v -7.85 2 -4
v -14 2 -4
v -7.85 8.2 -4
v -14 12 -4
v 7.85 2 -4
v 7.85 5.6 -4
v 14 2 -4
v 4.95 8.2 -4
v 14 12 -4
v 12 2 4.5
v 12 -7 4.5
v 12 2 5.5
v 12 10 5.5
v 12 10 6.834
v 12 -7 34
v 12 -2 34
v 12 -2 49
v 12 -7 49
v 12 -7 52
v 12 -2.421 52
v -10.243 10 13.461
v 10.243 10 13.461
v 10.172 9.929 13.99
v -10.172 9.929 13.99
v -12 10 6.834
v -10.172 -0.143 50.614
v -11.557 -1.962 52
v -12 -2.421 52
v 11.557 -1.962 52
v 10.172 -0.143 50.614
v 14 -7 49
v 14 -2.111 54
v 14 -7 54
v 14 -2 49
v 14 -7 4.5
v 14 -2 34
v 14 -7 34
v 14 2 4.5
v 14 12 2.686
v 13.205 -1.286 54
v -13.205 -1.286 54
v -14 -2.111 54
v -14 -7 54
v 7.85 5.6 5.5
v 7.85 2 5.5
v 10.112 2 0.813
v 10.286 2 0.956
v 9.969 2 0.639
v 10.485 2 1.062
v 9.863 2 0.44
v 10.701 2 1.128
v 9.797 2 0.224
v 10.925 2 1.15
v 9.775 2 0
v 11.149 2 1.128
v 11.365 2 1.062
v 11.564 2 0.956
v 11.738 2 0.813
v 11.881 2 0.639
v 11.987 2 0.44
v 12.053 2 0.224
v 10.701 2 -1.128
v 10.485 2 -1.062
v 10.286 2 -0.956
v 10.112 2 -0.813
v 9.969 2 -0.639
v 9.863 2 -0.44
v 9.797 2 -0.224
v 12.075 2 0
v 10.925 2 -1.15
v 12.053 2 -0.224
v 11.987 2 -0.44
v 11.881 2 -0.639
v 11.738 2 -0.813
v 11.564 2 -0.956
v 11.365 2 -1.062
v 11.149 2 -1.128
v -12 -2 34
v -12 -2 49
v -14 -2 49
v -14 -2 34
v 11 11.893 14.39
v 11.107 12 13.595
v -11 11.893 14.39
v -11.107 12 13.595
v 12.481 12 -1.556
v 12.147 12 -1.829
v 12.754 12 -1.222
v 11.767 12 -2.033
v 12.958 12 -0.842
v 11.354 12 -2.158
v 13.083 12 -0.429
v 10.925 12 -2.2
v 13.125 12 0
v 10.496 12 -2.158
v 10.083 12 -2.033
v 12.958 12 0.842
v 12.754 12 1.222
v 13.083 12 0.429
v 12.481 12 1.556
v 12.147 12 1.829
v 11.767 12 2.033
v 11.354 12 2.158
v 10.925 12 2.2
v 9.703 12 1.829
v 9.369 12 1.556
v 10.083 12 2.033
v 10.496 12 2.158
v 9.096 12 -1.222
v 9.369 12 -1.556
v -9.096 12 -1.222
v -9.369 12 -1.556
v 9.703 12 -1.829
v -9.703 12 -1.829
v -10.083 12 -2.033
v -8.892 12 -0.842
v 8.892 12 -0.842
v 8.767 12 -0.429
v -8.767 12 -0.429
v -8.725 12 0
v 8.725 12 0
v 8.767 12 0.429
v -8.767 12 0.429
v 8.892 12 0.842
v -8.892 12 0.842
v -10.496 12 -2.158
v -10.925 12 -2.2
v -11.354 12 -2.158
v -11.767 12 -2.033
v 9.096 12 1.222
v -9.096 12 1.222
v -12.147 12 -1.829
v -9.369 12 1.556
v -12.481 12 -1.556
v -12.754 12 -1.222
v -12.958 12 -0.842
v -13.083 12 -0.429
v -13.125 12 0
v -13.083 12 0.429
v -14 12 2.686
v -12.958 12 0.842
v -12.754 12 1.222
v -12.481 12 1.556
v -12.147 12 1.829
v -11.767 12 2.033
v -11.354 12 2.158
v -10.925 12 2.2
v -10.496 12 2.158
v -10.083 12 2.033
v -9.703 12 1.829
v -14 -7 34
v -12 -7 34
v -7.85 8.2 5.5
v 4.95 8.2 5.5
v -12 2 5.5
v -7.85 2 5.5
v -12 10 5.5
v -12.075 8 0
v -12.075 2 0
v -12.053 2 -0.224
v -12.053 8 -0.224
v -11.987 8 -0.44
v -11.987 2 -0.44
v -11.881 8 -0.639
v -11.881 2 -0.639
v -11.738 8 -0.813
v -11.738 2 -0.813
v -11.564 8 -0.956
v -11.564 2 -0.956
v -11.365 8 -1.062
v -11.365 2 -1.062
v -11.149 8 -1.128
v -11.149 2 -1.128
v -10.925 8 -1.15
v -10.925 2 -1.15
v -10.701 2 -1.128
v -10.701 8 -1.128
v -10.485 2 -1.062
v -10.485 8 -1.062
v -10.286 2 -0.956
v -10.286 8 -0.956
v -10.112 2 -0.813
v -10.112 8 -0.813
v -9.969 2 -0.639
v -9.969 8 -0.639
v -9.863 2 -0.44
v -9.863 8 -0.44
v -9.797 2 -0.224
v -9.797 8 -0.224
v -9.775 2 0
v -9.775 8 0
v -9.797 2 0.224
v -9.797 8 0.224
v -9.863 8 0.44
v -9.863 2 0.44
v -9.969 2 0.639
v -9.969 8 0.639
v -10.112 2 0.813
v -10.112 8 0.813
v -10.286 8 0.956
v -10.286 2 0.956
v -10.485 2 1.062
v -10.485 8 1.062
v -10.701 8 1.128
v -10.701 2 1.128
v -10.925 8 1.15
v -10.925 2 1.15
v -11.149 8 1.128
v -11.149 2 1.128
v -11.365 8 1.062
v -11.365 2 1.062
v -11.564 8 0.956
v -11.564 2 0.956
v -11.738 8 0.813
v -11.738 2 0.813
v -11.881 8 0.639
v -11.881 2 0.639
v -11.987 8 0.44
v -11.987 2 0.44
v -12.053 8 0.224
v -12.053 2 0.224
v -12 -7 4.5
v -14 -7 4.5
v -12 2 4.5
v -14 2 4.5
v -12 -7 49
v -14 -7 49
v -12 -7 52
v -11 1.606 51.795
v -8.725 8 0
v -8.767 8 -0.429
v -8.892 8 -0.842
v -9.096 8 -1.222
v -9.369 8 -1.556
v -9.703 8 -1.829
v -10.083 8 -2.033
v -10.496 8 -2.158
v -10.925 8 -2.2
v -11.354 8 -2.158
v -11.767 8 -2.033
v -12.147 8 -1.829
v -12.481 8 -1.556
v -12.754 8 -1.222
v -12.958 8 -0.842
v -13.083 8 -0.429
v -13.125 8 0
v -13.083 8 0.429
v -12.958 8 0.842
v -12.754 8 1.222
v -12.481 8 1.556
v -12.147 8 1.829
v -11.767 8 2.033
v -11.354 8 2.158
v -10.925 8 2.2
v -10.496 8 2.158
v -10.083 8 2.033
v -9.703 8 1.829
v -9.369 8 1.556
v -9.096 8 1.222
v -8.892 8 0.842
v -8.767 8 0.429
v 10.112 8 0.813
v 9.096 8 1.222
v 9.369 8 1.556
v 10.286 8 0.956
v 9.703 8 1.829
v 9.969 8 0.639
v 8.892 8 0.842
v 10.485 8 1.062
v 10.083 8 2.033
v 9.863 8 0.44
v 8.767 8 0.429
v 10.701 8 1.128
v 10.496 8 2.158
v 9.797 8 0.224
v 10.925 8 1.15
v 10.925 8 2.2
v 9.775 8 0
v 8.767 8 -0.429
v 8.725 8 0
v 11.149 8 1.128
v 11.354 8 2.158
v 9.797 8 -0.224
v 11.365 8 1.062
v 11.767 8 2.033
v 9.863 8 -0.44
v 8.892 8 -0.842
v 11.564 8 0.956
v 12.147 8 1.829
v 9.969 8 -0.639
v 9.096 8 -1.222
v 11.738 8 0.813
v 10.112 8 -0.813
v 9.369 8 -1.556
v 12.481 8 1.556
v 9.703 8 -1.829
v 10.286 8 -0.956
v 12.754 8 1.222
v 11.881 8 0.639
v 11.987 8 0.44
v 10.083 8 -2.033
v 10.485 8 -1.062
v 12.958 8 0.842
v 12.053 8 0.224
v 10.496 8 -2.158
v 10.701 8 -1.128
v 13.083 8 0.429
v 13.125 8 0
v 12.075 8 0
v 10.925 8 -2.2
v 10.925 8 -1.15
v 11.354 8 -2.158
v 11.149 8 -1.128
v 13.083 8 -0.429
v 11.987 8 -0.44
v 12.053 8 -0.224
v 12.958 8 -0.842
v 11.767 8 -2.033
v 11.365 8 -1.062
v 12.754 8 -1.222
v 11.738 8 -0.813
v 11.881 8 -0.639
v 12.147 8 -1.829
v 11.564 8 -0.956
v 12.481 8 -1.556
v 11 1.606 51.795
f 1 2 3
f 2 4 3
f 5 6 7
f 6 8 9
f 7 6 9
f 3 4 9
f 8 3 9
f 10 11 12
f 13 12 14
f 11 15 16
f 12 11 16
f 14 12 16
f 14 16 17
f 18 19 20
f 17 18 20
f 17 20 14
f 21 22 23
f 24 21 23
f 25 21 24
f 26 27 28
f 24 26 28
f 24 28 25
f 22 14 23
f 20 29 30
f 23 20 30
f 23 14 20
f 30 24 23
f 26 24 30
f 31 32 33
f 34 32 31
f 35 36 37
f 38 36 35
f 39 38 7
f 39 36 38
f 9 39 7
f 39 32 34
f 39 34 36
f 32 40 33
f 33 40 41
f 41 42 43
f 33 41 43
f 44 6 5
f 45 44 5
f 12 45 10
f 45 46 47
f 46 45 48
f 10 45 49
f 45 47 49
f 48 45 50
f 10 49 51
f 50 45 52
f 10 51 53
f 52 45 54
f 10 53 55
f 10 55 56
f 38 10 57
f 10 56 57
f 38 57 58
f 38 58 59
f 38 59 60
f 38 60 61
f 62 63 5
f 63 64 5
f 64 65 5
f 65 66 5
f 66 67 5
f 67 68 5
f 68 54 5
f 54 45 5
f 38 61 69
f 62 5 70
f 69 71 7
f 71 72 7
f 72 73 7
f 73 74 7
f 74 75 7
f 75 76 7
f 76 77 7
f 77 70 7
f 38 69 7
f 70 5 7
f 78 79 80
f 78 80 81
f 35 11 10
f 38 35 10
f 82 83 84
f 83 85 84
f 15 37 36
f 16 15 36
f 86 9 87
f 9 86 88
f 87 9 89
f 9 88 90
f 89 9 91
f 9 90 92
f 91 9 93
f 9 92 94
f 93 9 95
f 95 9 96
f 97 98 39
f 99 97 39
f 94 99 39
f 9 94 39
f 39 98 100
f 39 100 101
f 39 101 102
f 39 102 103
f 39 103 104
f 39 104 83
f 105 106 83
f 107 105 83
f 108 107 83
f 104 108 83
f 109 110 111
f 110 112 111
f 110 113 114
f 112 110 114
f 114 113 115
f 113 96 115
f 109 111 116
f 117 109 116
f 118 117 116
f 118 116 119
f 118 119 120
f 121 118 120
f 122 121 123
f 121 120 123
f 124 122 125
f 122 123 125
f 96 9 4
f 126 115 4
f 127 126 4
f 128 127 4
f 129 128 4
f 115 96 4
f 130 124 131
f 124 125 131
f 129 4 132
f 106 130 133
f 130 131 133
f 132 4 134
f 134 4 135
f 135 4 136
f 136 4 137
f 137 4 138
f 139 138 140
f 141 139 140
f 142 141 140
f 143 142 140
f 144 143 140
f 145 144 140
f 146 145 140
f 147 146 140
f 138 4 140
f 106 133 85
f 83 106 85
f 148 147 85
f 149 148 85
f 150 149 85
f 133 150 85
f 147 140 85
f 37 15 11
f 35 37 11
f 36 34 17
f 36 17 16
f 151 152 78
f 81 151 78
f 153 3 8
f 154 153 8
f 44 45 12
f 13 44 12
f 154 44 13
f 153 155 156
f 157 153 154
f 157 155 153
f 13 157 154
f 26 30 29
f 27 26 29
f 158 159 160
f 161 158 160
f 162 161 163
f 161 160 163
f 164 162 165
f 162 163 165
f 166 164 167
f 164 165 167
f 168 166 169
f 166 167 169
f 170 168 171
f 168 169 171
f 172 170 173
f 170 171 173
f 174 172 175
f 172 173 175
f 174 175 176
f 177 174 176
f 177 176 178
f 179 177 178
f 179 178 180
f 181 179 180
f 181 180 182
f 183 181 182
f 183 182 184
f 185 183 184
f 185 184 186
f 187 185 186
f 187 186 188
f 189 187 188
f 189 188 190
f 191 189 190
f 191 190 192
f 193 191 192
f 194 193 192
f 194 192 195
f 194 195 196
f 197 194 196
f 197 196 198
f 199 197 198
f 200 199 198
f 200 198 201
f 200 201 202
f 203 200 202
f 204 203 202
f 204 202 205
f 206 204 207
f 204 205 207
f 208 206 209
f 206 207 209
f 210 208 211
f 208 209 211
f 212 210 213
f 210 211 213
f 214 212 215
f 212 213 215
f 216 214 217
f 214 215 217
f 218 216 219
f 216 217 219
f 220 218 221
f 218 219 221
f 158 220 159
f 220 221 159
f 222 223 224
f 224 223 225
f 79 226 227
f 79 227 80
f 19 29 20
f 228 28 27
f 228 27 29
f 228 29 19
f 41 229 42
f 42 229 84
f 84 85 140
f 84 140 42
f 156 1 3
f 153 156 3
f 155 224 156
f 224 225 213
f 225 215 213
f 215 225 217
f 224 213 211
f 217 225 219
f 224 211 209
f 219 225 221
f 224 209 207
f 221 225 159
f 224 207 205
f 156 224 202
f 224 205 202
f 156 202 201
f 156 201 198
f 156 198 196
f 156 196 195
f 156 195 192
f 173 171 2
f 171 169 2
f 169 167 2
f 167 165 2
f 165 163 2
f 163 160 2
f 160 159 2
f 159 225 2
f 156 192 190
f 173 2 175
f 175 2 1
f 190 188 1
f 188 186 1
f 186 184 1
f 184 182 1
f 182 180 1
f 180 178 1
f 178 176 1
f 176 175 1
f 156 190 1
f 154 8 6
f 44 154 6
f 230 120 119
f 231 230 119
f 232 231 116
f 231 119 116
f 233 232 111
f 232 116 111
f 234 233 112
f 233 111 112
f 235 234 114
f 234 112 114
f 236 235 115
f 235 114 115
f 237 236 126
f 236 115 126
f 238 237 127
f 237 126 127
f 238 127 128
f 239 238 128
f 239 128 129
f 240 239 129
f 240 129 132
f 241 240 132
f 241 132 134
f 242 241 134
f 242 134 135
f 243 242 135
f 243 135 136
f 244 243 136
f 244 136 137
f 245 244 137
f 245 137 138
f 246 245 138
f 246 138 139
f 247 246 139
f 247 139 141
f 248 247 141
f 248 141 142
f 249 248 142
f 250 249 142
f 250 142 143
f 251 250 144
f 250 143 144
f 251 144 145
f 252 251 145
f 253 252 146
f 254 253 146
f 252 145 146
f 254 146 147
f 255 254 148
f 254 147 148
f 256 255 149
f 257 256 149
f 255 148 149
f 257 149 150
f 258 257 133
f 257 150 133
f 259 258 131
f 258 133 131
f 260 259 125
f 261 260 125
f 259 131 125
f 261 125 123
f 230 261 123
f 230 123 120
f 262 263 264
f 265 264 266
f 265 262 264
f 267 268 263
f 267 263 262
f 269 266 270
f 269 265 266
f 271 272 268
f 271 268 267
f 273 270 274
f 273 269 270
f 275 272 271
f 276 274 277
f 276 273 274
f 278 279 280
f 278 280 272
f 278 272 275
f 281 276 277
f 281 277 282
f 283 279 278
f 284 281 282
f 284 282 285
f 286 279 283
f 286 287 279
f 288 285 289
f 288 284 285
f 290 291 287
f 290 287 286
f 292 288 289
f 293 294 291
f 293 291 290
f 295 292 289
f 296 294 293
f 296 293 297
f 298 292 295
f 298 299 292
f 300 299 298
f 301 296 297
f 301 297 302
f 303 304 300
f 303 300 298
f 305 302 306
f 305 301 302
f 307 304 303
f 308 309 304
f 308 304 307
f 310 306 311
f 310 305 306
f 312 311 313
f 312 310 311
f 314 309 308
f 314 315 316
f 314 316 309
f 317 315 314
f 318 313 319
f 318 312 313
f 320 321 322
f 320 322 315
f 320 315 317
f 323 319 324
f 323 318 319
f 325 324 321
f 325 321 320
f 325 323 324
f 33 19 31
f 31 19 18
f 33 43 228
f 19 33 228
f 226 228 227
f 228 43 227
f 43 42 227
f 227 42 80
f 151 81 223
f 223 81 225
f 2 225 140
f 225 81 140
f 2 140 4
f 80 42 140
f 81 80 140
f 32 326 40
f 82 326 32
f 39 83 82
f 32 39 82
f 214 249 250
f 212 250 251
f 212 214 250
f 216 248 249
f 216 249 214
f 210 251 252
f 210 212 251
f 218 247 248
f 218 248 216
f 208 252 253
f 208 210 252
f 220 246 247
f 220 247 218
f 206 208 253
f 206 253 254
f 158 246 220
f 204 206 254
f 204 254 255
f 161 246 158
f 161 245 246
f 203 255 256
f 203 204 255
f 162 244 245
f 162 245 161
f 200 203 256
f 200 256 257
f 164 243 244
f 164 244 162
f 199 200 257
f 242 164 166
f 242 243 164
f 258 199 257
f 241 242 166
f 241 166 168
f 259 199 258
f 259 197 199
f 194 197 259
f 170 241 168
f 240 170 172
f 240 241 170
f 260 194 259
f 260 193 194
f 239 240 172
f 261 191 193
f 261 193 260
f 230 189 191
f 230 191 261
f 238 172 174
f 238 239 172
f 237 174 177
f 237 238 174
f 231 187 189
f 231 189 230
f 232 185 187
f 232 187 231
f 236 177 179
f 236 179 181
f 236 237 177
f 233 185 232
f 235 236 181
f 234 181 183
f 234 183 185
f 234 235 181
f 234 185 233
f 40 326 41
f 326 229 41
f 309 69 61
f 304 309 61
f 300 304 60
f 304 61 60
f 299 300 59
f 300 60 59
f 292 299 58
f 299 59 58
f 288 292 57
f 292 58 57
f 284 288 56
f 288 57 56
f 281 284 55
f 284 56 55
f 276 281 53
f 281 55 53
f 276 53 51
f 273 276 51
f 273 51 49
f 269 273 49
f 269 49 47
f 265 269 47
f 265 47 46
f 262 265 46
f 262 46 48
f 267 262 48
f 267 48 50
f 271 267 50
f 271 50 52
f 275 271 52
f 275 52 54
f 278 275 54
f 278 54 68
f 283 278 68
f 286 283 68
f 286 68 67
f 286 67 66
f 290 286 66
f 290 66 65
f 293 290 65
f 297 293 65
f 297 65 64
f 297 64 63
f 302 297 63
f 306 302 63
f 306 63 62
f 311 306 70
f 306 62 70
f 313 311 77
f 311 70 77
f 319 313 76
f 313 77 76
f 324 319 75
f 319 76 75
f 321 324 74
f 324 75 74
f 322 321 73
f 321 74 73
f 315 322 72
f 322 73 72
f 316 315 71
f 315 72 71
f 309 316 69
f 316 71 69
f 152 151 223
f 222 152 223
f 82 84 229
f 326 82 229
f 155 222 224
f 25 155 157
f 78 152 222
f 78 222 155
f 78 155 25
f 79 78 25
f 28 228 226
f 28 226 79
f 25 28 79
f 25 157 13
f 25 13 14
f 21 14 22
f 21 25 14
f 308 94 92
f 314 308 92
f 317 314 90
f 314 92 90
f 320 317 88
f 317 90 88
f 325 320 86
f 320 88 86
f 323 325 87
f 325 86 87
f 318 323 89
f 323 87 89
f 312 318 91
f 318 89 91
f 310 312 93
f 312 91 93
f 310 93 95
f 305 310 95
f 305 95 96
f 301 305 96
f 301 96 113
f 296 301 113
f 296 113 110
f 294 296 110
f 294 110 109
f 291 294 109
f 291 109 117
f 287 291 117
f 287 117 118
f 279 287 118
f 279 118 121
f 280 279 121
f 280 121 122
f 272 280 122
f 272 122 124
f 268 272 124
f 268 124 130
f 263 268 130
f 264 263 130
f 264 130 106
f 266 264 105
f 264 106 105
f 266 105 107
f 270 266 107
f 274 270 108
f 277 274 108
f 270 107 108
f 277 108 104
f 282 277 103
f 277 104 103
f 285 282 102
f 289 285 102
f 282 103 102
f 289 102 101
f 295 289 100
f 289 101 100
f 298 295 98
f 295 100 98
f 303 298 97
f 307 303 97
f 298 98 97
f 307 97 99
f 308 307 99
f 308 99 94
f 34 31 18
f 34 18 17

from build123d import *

# Parameters (mm, degrees)
BOSS_EXTRU_1_DEPTH                                = 4
ESQUISSE2_R                                       = 1.15
ENL_V_MAT_EXTRU_1_DEPTH                           = 18.663521733
CHAMBRAGE_POUR_VIS_SIX_PANS_CREUX_M21_D           = 2.2
CHAMBRAGE_POUR_VIS_SIX_PANS_CREUX_M21_CBORE_D     = 4.4
CHAMBRAGE_POUR_VIS_SIX_PANS_CREUX_M21_CBORE_DEPTH = 4
BOSS_EXTRU_2_DEPTH                                = 28
COQUE1_START                                      = -12
COQUE1_DEPTH                                      = 24
COQUE1_START_2                                    = -51.994775807
COQUE1_2_DEPTH                                    = 48.056615462
ENL_V_MAT_EXTRU_2_DEPTH                           = 11
ESQUISSE8_W                                       = 15
ESQUISSE8_H                                       = 5
ENL_V_MAT_EXTRU_3_DEPTH                           = 63


with BuildPart() as part:
    # Esquisse1 → Boss.-Extru.1 (new, symmetric)
    with BuildSketch(Plane.XY):
        Polygon((-14, 2), (-7.85, 2), (-7.85, 8.2), (4.95, 8.2), (7.85, 5.6), (7.85, 2), (14, 2), (14, 12), (-14, 12), align=None)
    extrude(amount=BOSS_EXTRU_1_DEPTH, both=True)

    # Esquisse2 → Enlèv. mat.-Extru.1 (cut, through all)
    with BuildSketch(Plane.XZ.offset(-2)):
        with Locations((10.925, 0)):
            Circle(ESQUISSE2_R)
        with Locations(Location((-10.925, 0, 0), (0, 0, 180))):
            Circle(ESQUISSE2_R)
    extrude(amount=-ENL_V_MAT_EXTRU_1_DEPTH, mode=Mode.SUBTRACT)

    # Chambrage pour vis à six pans creux M21 (through all)
    with Locations(Plane(origin=(0, 12, 0), x_dir=(1, 0, 0), z_dir=(0, 1, 0))):
        with Locations((-10.925, 0), (10.925, 0)):
            CounterBoreHole(CHAMBRAGE_POUR_VIS_SIX_PANS_CREUX_M21_D / 2, CHAMBRAGE_POUR_VIS_SIX_PANS_CREUX_M21_CBORE_D / 2, CHAMBRAGE_POUR_VIS_SIX_PANS_CREUX_M21_CBORE_DEPTH)

    # Esquisse6 → Boss.-Extru.2 (add)
    with BuildSketch(Plane.ZY.offset(14)):
        Polygon((4.5, 2), (4, 2), (4, 12), (14, 12), (54, 1), (54, -7), (4.5, -7), align=None)
    extrude(amount=-BOSS_EXTRU_2_DEPTH)

    # Chanfrein1
    # the kernel refuses this chamfer: 3 mm, written as the material it takes off along each edge
    with BuildSketch(Plane(origin=(-19.957306113, 1, 54), x_dir=(0, 0.2651564830210424, -0.9642053928037904), z_dir=(1, 0, 0))) as chanfrein1_piece_1:
        with BuildLine():
            Line((2.381812022, 0.07273839), (-0.701687646, -2.277268941))
            Line((-0.701687646, -2.277268941), (-0.75953997, -2.261359552))
            ThreePointArc((-0.75953997, -2.261359552), (-0.373628773, -1.132368609), (-0.057852324, 0.015909389))
            Line((-0.057852324, 0.015909389), (0, 0.06))
            ThreePointArc((0, 0.06), (1.190906011, 0.06), (2.381812022, 0.13273839))
            Line((2.381812022, 0.13273839), (2.381812022, 0.07273839))
        make_face()
    extrude(amount=39.914612227, mode=Mode.SUBTRACT)
    with BuildSketch(Plane(origin=(14, 15.477681924, 1.353883912), x_dir=(-1, 0, 0), z_dir=(0, -0.26515648302104217, 0.9642053928037905))) as chanfrein1_piece_2:
        with BuildLine():
            Line((3.084852814, -0.084852814), (-0.084852814, 3.084852814))
            Line((-0.084852814, 3.084852814), (-0.144852814, 3.084852814))
            ThreePointArc((-0.144852814, 3.084852814), (-0.06, 1.542426407), (-0.06, 0))
            Line((-0.06, 0), (0, -0.06))
            ThreePointArc((0, -0.06), (1.542426407, -0.06), (3.084852814, -0.144852814))
            Line((3.084852814, -0.144852814), (3.084852814, -0.084852814))
        make_face()
    extrude(amount=62.315569228, mode=Mode.SUBTRACT)
    with BuildSketch(Plane(origin=(-15.310375108, 12, 14), x_dir=(0, 0, -1), z_dir=(1, 0, 0))) as chanfrein1_piece_3:
        with BuildLine():
            Line((0.523904139, 0.016053697), (-0.509407938, -0.123437518))
            Line((-0.509407938, -0.123437518), (-0.525317327, -0.065585195))
            ThreePointArc((-0.525317327, -0.065585195), (-0.268484987, -0.011605966), (-0.015909389, 0.057852324))
            Line((-0.015909389, 0.057852324), (0, 0.06))
            ThreePointArc((0, 0.06), (0.261952069, 0.06), (0.523904139, 0.076053697))
            Line((0.523904139, 0.076053697), (0.523904139, 0.016053697))
        make_face()
    extrude(amount=30.620750216, mode=Mode.SUBTRACT)
    with BuildSketch(Plane(origin=(-14, 15.477681924, 1.353883912), x_dir=(1, 0, 0), z_dir=(0, -0.26515648302104217, 0.9642053928037905))) as chanfrein1_piece_4:
        with BuildLine():
            Line((3.084852814, 0.084852814), (-0.084852814, -3.084852814))
            Line((-0.084852814, -3.084852814), (-0.144852814, -3.084852814))
            ThreePointArc((-0.144852814, -3.084852814), (-0.06, -1.542426407), (-0.06, 0))
            Line((-0.06, 0), (0, 0.06))
            ThreePointArc((0, 0.06), (1.542426407, 0.06), (3.084852814, 0.144852814))
            Line((3.084852814, 0.144852814), (3.084852814, 0.084852814))
        make_face()
    extrude(amount=62.315569228, mode=Mode.SUBTRACT)

    # Coque1: read off the stored shape, not the designer's step
    # Coque1 outline → Coque1 (cut)
    with BuildSketch(Plane.YZ.offset(COQUE1_START)):
        Polygon((-7, 5.5), (10, 5.5), (10, 13.460632375), (9.928572392, 13.989748207), (-0.143118288, 50.614077951), (-1.961619074, 52), (-7, 52), align=None)
    extrude(amount=COQUE1_DEPTH, mode=Mode.SUBTRACT)

    # Coque1 2 outline → Coque1 2 (add)
    with BuildSketch(Plane(origin=(0, 0, 0), x_dir=(1, 0, 0), z_dir=(0, 0.26515648302104255, -0.9642053928037904)).offset(COQUE1_START_2)):
        Polygon((12, -11.454228351), (10.171572875, -13.282655476), (12, -13.282655476), align=None)
        Polygon((-10.171572875, -13.282655476), (-12, -11.454228351), (-12, -13.282655476), align=None)
    extrude(amount=COQUE1_2_DEPTH)

    # Esquisse7 → Enlèv. mat.-Extru.2 (cut)
    with BuildSketch(Plane(origin=(0, 0, -4), x_dir=(-1, 0, 0), z_dir=(0, 0, -1))):
        Polygon((-12, 2), (-12, -7), (12, -7), (12, 2), (7.85, 2), (-7.85, 2), align=None)
        Polygon((-7.85, 2), (7.85, 2), (7.85, 8.2), (-4.95, 8.2), (-7.85, 5.6), align=None)
    extrude(amount=-ENL_V_MAT_EXTRU_2_DEPTH, mode=Mode.SUBTRACT)

    # Esquisse8 → Enlèv. mat.-Extru.3 (cut, through all)
    with BuildSketch(Plane(origin=(14, 0, 0), x_dir=(0, 0, -1), z_dir=(1, 0, 0))):
        with Locations((-41.5, -4.5)):
            Rectangle(ESQUISSE8_W, ESQUISSE8_H)
    extrude(amount=-ENL_V_MAT_EXTRU_3_DEPTH, mode=Mode.SUBTRACT)


solid = part.part
